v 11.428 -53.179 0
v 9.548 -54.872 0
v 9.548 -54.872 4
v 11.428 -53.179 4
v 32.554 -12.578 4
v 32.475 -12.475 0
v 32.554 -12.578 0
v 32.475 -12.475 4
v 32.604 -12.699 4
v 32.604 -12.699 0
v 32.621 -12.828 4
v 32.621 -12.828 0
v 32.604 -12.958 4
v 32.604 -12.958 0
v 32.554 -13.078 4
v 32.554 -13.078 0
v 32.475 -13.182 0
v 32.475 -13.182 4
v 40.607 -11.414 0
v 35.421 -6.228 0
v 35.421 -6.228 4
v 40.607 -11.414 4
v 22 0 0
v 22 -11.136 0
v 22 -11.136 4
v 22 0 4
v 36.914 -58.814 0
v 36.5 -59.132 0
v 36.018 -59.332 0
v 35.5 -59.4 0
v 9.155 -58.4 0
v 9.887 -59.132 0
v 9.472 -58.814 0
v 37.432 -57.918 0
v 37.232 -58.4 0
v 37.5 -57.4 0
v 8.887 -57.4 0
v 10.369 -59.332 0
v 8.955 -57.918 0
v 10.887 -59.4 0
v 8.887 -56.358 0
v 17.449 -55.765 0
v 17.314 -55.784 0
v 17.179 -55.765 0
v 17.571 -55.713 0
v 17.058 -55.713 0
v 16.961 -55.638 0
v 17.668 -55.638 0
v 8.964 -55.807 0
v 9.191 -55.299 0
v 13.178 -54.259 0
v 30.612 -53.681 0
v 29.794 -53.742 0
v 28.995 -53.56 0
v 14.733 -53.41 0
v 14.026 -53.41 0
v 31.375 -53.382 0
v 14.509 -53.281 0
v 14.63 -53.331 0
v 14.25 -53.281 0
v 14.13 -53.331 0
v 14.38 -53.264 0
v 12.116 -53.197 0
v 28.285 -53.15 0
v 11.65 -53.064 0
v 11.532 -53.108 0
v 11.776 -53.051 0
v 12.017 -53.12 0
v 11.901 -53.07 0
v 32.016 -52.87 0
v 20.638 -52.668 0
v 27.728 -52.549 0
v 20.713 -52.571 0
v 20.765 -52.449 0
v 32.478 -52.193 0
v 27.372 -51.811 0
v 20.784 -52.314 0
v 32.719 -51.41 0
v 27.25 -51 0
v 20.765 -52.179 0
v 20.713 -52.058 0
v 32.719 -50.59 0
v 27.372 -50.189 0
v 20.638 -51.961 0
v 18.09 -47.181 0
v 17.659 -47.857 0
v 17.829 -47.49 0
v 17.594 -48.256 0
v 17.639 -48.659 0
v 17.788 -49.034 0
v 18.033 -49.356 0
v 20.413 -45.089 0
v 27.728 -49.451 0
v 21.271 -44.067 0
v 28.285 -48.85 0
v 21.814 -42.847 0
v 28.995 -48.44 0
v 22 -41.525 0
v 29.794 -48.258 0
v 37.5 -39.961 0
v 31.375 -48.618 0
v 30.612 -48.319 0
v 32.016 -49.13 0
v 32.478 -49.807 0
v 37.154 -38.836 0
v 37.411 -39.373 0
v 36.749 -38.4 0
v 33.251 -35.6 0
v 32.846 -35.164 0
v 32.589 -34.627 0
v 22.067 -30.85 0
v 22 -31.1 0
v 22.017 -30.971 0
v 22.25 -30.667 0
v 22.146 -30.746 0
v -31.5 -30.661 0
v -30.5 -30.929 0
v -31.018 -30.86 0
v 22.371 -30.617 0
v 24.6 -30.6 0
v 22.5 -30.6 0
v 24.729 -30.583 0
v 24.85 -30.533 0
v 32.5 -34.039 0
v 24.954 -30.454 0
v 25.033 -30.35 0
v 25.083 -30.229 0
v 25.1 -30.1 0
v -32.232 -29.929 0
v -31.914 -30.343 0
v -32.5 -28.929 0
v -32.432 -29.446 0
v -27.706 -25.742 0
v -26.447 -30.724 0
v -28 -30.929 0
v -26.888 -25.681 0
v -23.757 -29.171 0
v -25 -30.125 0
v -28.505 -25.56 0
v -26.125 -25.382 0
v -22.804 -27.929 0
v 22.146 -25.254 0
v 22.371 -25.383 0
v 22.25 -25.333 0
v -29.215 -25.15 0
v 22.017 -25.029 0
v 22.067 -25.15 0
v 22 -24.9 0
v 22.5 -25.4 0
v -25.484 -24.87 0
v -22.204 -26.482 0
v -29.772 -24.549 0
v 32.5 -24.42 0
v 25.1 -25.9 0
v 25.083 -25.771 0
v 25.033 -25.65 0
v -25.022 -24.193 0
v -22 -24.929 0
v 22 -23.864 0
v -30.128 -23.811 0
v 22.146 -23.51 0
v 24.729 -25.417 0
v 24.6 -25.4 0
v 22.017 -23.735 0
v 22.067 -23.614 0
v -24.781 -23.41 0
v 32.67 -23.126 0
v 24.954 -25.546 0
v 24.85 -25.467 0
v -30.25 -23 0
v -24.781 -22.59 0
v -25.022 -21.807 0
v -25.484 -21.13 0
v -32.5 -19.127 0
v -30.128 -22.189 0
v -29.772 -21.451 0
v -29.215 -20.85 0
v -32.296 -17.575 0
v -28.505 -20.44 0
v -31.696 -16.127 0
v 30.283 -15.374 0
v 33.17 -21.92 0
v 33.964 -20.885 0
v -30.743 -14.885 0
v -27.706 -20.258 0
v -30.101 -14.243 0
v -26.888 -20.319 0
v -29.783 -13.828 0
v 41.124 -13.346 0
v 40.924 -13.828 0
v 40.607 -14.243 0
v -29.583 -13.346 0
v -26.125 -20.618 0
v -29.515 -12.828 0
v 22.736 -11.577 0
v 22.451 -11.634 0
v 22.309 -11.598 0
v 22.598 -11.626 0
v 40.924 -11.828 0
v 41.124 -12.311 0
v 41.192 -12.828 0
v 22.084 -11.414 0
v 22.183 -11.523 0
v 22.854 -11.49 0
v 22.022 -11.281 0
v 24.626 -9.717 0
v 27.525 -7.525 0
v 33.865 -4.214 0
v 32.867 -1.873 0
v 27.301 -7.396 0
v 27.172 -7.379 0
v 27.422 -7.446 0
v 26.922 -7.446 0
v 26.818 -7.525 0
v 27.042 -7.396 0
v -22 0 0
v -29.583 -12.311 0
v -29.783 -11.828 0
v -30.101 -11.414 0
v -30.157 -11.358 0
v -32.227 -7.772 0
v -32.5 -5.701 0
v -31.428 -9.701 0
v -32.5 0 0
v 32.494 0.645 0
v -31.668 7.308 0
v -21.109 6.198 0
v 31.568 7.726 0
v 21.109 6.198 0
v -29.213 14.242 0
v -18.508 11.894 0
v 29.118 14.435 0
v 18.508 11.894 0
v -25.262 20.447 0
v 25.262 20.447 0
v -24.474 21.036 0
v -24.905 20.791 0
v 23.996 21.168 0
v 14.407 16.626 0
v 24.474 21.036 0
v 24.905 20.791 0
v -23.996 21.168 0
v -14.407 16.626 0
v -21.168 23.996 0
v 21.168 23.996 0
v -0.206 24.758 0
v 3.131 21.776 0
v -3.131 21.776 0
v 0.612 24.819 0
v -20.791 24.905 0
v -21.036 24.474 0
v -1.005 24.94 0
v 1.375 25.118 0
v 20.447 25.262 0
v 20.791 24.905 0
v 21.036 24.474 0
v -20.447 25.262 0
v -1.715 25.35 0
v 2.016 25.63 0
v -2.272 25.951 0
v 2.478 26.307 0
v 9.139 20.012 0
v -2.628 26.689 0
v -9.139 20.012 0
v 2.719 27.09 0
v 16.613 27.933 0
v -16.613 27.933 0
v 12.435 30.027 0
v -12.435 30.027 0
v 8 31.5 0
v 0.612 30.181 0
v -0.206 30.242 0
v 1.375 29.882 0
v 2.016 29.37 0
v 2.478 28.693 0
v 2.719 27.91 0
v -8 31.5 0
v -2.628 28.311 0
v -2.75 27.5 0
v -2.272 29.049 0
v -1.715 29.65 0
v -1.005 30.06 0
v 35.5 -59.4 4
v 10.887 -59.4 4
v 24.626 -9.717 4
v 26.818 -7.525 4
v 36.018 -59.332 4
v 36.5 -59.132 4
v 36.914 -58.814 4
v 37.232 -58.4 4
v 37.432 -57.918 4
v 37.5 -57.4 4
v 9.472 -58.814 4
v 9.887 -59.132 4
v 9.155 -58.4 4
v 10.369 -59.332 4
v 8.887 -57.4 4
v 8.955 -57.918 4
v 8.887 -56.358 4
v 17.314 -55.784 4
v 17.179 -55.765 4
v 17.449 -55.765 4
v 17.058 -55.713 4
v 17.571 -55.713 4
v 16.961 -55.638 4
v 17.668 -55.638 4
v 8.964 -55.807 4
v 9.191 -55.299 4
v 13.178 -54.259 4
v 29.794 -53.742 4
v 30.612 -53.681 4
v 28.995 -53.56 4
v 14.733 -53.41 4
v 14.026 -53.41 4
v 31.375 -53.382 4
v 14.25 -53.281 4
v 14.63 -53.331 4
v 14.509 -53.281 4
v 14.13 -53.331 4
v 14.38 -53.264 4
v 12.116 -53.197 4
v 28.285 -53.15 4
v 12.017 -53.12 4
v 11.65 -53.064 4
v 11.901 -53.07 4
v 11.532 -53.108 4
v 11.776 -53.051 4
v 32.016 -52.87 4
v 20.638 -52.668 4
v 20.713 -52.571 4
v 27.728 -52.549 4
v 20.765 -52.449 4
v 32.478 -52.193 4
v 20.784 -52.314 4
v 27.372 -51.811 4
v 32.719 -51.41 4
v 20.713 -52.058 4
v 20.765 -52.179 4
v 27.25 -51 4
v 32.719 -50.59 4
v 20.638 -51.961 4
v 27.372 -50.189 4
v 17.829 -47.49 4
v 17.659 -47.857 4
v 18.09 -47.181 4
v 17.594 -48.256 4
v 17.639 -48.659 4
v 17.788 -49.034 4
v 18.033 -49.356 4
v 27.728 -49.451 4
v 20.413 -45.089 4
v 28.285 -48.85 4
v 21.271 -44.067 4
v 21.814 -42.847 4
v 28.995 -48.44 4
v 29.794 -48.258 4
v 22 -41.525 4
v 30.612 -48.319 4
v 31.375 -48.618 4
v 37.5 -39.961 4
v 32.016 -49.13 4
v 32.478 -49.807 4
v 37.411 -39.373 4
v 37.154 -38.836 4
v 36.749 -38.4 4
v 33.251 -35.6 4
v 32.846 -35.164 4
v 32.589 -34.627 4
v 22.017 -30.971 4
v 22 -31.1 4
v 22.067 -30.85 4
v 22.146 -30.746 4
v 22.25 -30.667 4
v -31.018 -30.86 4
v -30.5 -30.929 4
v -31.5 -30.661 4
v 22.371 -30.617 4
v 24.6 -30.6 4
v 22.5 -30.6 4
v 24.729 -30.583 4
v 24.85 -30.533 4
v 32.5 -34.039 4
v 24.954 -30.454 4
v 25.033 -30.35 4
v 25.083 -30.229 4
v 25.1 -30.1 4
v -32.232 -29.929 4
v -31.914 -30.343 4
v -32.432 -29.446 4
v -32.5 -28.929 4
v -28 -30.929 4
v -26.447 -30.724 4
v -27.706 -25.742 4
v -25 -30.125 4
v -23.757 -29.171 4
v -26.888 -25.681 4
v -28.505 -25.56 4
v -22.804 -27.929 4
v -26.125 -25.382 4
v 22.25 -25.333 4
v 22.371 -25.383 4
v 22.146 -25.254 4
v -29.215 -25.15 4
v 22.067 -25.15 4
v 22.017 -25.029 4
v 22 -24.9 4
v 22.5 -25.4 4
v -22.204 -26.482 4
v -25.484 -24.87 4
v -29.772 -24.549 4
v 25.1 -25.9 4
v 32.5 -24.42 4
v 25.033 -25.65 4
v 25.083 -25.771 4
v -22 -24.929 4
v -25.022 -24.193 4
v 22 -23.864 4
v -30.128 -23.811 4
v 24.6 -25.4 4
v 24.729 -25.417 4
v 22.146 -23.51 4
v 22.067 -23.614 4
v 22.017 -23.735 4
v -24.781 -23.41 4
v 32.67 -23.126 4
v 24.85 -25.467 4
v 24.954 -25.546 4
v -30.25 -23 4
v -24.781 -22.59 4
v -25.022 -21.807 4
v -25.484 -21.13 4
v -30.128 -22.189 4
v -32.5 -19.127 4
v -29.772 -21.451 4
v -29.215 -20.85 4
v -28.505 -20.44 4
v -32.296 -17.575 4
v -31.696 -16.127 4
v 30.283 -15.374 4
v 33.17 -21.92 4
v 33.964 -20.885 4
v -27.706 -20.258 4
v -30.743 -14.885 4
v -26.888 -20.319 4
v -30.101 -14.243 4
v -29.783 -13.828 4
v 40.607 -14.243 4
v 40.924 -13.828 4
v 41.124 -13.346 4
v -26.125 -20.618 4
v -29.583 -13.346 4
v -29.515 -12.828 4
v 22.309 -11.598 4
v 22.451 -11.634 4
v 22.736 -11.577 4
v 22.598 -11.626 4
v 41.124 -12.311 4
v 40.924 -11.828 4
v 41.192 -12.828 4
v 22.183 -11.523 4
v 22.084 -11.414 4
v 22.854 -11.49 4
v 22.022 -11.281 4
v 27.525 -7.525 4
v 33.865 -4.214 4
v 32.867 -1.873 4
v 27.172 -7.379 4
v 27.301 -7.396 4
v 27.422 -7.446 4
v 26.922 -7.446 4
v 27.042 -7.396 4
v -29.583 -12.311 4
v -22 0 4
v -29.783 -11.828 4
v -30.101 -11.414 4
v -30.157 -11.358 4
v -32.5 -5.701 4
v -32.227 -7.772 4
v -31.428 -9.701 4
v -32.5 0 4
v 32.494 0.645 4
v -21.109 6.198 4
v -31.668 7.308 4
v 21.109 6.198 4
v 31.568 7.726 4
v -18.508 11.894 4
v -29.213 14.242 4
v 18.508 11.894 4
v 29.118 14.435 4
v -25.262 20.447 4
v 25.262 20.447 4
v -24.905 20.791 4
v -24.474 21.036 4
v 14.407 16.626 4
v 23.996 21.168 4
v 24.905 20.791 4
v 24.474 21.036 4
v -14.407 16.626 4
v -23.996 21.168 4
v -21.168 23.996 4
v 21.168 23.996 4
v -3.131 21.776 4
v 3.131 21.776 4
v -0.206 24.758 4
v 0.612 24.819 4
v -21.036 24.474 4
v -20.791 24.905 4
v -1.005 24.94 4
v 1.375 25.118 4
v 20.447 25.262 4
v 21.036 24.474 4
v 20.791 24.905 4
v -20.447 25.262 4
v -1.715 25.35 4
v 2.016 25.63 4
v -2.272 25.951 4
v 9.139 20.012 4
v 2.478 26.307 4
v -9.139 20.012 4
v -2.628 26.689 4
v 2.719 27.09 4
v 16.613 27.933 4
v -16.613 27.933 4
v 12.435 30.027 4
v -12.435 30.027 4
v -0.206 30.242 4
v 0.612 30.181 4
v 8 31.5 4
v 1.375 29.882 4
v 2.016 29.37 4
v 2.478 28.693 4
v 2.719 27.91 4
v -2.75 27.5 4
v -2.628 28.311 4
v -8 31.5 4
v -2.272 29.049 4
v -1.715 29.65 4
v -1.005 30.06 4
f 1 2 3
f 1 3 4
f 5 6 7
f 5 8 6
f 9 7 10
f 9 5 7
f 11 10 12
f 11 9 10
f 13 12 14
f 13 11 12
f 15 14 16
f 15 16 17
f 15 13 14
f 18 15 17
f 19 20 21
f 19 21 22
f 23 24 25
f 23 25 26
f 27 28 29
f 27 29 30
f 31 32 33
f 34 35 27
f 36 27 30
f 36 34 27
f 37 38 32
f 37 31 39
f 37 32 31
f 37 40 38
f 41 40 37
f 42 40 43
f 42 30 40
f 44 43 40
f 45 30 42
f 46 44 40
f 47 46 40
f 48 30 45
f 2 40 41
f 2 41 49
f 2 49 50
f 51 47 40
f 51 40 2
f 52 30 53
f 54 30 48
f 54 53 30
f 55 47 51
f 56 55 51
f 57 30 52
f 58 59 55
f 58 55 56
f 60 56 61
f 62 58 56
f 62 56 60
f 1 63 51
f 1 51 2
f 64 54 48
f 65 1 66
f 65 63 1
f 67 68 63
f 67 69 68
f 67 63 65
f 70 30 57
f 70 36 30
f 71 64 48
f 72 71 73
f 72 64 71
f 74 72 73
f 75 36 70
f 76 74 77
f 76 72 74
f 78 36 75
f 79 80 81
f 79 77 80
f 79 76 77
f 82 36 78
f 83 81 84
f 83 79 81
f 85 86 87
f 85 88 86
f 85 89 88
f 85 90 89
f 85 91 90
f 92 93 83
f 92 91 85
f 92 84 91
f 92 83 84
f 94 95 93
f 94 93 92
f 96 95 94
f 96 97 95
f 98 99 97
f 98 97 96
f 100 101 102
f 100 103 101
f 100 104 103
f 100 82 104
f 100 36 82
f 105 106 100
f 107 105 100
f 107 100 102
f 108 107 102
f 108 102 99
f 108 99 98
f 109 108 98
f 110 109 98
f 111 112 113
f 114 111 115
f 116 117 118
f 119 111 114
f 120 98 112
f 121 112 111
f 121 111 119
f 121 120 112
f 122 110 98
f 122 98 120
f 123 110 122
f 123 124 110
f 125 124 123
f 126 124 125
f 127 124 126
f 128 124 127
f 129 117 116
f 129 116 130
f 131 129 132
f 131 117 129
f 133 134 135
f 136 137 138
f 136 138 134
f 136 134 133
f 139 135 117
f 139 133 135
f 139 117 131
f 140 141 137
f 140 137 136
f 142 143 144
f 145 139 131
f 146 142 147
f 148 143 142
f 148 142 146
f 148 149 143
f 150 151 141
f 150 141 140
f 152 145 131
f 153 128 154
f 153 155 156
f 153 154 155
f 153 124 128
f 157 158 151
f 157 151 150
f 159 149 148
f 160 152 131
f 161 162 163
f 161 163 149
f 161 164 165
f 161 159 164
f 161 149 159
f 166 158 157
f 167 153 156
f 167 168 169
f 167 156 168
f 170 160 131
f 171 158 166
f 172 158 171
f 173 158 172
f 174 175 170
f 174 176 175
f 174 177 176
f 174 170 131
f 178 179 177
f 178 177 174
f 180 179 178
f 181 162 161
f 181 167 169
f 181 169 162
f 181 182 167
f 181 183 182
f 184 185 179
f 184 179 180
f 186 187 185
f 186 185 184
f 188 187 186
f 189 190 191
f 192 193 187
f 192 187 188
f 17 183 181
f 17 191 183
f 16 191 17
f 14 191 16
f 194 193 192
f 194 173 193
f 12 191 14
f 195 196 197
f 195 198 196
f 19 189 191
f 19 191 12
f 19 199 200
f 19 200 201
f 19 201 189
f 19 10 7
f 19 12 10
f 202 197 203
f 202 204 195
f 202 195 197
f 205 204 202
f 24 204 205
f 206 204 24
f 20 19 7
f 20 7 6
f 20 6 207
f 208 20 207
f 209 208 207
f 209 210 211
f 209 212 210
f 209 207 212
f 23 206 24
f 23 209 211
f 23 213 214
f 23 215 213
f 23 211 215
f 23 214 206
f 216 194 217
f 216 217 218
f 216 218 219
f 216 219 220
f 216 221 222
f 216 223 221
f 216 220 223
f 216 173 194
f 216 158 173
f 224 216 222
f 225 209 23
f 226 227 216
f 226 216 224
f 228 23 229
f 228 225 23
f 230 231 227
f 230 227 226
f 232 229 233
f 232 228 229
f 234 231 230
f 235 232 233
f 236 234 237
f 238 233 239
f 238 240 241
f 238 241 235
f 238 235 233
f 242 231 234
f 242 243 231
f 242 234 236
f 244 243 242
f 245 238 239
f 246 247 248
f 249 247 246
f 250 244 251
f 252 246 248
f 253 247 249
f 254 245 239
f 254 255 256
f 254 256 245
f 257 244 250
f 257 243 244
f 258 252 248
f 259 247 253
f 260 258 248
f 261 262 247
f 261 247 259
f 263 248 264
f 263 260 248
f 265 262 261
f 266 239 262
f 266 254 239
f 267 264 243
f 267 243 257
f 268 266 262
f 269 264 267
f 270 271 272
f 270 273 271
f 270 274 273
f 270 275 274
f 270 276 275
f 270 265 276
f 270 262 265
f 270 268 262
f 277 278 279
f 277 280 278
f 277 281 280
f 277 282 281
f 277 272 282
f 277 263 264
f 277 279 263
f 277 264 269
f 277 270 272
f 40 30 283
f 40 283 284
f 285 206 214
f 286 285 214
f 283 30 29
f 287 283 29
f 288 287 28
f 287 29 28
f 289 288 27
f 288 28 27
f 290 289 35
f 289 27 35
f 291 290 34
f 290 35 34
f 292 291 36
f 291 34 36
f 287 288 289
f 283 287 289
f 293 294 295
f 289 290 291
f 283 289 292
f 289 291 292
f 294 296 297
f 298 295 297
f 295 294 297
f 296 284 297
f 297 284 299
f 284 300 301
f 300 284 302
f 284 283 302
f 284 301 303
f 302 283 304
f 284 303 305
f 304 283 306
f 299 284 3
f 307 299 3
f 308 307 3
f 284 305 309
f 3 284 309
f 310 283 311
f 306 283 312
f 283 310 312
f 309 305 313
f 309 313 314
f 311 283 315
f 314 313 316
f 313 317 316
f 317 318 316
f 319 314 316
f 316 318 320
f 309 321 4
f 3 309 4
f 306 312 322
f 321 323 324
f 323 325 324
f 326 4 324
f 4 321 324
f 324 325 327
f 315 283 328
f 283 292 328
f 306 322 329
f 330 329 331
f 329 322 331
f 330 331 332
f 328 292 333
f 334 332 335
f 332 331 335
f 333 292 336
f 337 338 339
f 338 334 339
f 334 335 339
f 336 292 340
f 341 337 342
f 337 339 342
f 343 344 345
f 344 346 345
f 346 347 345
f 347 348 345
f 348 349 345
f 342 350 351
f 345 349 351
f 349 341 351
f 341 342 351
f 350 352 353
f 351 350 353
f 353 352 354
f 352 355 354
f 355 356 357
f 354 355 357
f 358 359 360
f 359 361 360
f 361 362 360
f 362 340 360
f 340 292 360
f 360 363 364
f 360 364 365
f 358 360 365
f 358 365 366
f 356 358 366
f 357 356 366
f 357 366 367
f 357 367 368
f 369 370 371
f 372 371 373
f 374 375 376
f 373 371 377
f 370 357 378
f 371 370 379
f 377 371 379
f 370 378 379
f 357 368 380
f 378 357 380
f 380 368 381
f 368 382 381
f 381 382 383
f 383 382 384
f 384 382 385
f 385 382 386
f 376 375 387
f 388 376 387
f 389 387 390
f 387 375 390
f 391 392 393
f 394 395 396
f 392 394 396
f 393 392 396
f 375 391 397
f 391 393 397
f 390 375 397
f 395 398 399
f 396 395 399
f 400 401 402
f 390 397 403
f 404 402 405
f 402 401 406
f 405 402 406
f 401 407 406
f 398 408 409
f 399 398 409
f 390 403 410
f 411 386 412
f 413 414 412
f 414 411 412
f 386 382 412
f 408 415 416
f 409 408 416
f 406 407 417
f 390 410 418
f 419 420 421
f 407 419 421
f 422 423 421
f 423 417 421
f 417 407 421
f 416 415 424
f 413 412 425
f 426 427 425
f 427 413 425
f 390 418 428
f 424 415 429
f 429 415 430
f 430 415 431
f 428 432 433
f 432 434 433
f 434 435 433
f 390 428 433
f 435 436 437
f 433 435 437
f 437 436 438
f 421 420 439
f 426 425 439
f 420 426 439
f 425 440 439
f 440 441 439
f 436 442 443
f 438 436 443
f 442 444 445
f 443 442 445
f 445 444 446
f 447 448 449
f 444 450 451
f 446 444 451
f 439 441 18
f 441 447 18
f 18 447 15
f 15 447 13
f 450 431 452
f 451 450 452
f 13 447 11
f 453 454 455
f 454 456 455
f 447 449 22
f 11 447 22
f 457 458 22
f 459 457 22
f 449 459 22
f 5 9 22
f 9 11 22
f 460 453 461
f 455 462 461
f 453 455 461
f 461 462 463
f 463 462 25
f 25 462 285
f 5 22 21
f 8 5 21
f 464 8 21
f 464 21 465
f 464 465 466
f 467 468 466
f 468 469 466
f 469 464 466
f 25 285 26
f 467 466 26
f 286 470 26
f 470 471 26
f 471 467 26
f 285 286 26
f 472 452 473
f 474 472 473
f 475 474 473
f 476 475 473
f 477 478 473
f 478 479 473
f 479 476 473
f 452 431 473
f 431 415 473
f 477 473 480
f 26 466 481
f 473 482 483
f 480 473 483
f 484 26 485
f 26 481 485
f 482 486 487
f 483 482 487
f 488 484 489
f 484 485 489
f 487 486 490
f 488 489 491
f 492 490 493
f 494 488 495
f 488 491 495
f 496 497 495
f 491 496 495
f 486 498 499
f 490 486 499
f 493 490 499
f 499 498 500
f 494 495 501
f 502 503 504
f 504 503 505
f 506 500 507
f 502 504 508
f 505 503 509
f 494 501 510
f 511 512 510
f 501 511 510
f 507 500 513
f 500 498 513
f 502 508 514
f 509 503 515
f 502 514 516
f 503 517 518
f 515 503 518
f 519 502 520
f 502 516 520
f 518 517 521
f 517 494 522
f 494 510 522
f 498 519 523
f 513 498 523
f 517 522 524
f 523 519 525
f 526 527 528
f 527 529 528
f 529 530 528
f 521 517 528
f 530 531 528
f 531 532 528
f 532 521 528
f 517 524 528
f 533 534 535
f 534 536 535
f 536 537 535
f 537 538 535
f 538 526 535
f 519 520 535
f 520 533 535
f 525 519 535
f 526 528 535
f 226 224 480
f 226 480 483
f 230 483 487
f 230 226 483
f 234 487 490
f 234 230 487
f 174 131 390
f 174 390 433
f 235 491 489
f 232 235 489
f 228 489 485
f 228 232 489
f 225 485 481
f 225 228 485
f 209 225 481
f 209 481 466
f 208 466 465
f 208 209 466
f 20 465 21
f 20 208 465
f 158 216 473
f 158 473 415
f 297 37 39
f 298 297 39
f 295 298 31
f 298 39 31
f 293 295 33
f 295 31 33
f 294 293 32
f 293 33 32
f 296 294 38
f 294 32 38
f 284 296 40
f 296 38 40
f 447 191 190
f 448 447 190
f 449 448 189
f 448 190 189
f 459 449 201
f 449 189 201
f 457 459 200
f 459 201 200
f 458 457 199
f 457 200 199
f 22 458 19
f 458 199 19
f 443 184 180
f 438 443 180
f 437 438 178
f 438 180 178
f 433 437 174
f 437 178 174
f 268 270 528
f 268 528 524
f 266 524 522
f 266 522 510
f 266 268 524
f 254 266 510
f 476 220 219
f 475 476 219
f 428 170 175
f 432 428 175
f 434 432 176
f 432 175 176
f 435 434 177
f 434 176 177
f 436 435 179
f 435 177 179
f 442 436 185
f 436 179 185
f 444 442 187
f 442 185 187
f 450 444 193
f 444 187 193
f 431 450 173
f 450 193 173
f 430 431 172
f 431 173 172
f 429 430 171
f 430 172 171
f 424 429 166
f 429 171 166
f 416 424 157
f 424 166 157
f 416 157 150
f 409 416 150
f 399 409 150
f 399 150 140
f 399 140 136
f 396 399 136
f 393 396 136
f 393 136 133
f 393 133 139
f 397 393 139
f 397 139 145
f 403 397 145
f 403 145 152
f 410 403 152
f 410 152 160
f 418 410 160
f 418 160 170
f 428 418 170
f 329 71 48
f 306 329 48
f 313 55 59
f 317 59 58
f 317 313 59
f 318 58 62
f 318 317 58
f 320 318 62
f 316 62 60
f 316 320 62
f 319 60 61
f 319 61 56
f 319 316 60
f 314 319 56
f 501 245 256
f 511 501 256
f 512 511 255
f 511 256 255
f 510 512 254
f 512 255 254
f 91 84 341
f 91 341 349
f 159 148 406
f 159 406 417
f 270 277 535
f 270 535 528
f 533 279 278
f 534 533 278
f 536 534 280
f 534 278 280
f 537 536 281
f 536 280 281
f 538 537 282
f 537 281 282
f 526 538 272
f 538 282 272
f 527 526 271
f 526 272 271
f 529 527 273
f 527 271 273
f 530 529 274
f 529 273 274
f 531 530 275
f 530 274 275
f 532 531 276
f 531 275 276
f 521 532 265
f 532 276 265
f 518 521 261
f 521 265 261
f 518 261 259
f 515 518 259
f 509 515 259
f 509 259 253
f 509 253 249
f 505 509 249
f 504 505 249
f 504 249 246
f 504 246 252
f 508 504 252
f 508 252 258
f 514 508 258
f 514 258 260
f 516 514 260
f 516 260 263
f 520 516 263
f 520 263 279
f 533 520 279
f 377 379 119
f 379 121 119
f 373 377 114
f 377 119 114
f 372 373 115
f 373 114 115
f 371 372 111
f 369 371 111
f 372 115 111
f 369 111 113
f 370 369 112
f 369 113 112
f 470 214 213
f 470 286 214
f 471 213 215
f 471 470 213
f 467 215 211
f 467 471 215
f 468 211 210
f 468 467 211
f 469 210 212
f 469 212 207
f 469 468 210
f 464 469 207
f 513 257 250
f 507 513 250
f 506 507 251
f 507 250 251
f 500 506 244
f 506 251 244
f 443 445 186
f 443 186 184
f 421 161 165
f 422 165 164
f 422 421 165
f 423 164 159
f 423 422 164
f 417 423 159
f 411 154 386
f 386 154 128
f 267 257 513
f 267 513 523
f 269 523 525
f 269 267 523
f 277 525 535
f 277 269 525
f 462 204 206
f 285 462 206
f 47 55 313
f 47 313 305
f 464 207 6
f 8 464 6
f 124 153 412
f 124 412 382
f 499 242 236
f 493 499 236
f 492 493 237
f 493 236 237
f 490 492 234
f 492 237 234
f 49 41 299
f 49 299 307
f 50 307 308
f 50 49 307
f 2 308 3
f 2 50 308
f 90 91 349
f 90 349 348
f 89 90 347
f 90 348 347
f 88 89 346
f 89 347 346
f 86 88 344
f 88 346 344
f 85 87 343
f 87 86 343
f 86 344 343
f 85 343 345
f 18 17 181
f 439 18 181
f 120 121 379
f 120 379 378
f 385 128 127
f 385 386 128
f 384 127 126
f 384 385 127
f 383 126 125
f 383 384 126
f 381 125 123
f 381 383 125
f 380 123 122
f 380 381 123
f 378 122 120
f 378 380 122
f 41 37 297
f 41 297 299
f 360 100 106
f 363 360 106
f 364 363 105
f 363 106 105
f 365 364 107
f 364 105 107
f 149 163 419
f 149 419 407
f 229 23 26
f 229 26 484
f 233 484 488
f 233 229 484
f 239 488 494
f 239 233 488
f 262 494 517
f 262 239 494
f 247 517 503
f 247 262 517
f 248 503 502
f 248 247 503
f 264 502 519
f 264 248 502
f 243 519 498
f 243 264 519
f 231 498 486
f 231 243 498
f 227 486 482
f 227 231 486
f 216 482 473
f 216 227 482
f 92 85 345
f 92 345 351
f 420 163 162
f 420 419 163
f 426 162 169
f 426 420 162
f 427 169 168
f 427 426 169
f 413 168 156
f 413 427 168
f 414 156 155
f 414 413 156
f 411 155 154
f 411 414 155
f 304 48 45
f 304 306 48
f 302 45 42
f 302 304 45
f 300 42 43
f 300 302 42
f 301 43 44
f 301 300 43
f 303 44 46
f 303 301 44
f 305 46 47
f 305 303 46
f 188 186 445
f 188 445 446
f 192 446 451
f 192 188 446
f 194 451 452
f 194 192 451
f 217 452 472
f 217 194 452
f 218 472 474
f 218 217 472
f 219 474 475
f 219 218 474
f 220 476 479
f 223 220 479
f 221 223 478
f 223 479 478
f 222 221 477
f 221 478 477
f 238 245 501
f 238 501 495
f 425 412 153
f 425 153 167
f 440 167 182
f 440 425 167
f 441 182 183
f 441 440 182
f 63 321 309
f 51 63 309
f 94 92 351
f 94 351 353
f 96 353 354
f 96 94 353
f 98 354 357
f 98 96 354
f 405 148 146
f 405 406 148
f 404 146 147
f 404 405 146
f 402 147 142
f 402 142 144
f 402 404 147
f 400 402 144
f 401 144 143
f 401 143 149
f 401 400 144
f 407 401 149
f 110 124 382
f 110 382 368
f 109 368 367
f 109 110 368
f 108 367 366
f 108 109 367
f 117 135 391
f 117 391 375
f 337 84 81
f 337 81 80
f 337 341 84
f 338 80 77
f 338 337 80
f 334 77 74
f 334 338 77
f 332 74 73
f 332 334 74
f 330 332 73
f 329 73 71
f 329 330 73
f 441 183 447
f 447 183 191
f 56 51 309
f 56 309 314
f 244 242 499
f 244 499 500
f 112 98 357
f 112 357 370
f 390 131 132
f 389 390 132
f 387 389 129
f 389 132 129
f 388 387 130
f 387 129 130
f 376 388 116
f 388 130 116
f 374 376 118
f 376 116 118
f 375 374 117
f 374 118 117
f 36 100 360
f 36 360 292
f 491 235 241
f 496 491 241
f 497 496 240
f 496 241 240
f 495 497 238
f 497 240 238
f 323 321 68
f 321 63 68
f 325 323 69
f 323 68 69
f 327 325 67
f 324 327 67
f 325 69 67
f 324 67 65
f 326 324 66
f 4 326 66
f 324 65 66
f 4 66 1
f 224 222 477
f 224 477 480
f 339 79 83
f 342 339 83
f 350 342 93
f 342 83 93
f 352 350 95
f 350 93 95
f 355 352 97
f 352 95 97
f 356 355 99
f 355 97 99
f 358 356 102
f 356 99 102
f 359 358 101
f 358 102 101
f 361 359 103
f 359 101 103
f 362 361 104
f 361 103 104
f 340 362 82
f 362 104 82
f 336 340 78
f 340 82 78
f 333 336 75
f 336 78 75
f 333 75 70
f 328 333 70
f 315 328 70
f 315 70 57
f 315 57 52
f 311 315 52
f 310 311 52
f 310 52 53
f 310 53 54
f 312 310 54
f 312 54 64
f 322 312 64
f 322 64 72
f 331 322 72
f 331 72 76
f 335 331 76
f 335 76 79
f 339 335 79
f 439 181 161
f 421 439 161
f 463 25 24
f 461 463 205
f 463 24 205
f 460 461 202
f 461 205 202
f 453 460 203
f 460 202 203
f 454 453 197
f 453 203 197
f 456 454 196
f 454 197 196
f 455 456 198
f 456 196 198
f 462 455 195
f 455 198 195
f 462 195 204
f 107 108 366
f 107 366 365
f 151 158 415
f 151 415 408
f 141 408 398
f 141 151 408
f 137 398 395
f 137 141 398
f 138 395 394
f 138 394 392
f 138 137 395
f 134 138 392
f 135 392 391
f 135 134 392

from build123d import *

# Parameters (mm, degrees)
CORPS_DEPTH                     = 4
DIAM_TRE_DU_PER_AGE_5_5_5_5_2_D = 5.5
RENFORT_CAVITE_IR_DEPTH         = 4
CAVITE_IR_DEPTH                 = 73.870494144
CAVITE_SWITCH_DEPTH             = 73.870494144
CONG_1_R                        = 2
CONG_1_R_2                      = 5
CONG_1_R_3                      = 10
CONG_1_R_4                      = 8
CONG_1_R_5                      = 6
CONG_1_R_6                      = 1.5
CONG_2_R                        = 0.5


with BuildPart() as part:
    # Esquisse1 → corps (new body)
    with BuildSketch(Plane.XY):
        with BuildLine():
            Line((-21.1677086, 23.996135725), (-21.1677086, 24.661267457))
            ThreePointArc((-21.1677086, 24.661267457), (-14.979348182, 28.84214153), (-8, 31.5))
            Line((-8, 31.5), (8, 31.5))
            ThreePointArc((8, 31.5), (14.979348182, 28.84214153), (21.1677086, 24.661267457))
            Line((21.1677086, 24.661267457), (21.1677086, 23.996135725))
            Line((21.1677086, 23.996135725), (23.996135725, 21.1677086))
            Line((23.996135725, 21.1677086), (24.661267457, 21.1677086))
            ThreePointArc((24.661267457, 21.1677086), (30.477378434, 11.286248439), (32.5, 0))
            Line((32.5, 0), (32.5, -35))
            Line((32.5, -35), (37.5, -39))
            Line((37.5, -39), (37.5, -59.4))
            Line((37.5, -59.4), (8.886620253, -59.4))
            Line((8.886620253, -59.4), (8.886620253, -56.358407696))
            ThreePointArc((8.886620253, -56.358407696), (9.059529338, -55.54493441), (9.54835904, -54.872118045))
            Line((9.54835904, -54.872118045), (20.413163329, -45.089404323))
            ThreePointArc((20.413163329, -45.089404323), (21.585367396, -43.476003838), (22, -41.525310806))
            Line((22, -41.525310806), (22, 0))
            ThreePointArc((22, 0), (0, 22), (-22, 0))
            Line((-22, 0), (-22, -24.928632557))
            ThreePointArc((-22, -24.928632557), (-23.757359313, -29.171273244), (-28, -30.928632557))
            Line((-28, -30.928632557), (-32.5, -30.928632557))
            Line((-32.5, -30.928632557), (-32.5, 0))
            ThreePointArc((-32.5, 0), (-30.477378434, 11.286248439), (-24.661267457, 21.1677086))
            Line((-24.661267457, 21.1677086), (-23.996135725, 21.1677086))
            Line((-23.996135725, 21.1677086), (-21.1677086, 23.996135725))
        make_face()
    extrude(amount=CORPS_DEPTH)

    # Diamètre du perçage Ø5.5 (5.5)2 (through all)
    with Locations(Plane.XY.offset(4)):
        with Locations((0, 27.5), (30, -51), (-27.5, -23)):
            Hole(DIAM_TRE_DU_PER_AGE_5_5_5_5_2_D / 2)

    # Esquisse4 → renfort_cavite_IR (add, through all)
    with BuildSketch(Plane.XY):
        Polygon((31.767766953, -2.575378798), (42.02081528, -12.828427125), (34.87903679, -19.970205615), (27.454415588, -27.394826817), (24.625988463, -9.717157288), align=None)
    extrude(amount=RENFORT_CAVITE_IR_DEPTH)

    # Esquisse4<4> → cavite_IR (cut, through all)
    with BuildSketch(Plane.XY):
        Polygon((0, -34.343145751), (24.625988463, -9.717157288), (27.171572875, -7.171572875), (32.828427125, -12.828427125), (30.282842712, -15.374011537), (0, -45.656854249), align=None)
        Polygon((-75.939696962, -31.797561338), (-42.828427125, 1.313708499), (-28.686291501, -12.828427125), (-61.797561338, -45.939696962), align=None)
    extrude(amount=CAVITE_IR_DEPTH, mode=Mode.SUBTRACT)

    # Esquisse5 → cavite_switch (cut, through all)
    with BuildSketch(Plane.XY):
        Polygon((13.884745674, -52.561700936), (12.661450942, -51.338406204), (16.338406204, -47.661450942), (17.561700936, -48.884745674), (17.915254326, -49.238299064), (20.920458146, -52.243502884), (20.991168825, -52.314213562), (17.314213562, -55.991168825), (17.243502884, -55.920458146), (14.238299064, -52.915254326), align=None)
        Polygon((13.884745674, -52.561700936), (12.661450942, -51.338406204), (11.459369414, -52.540487732), (13.177638892, -54.258757211), (14.37972042, -53.056675683), (14.238299064, -52.915254326), align=None)
        Polygon((18.52, -25.4), (20.25, -25.4), (20.75, -25.4), (25, -25.4), (25.1, -25.4), (25.1, -30.6), (25, -30.6), (20.75, -30.6), (20.25, -30.6), (18.52, -30.6), align=None)
        Polygon((20.75, -30.6), (20.25, -30.6), (18.52, -30.6), (18.52, -32.3), (20.95, -32.3), (20.95, -30.6), align=None)
    extrude(amount=CAVITE_SWITCH_DEPTH, mode=Mode.SUBTRACT)

    # Congé1
    # the kernel refuses this fillet: 10, 8, 6, 5, 2, 1.5 mm, written as the material it adds along each edge
    with BuildSketch(Plane(origin=(-28.686291501, -12.828427125, 0), x_dir=(-0.7071067811865516, 0.7071067811865436, 0), z_dir=(0, 0, 1))) as cong_1_piece_1:
        with BuildLine():
            CenterArc((CONG_1_R, CONG_1_R), CONG_1_R, 180, 90)
            Line((0, CONG_1_R), (0, 0))
            Line((0, 0), (CONG_1_R, 0))
        make_face()
    extrude(amount=4)
    with BuildSketch(Plane(origin=(32.5, -35, 0), x_dir=(0.7808688094430325, -0.6246950475544215, 0), z_dir=(0, 0, 1))) as cong_1_piece_2:
        with BuildLine():
            CenterArc((CONG_1_R * 0.480624847487, CONG_1_R), CONG_1_R, 218.659808254, 51.340191746)
            Line((-CONG_1_R * 0.300243961956, CONG_1_R * 0.375304952446), (0, 0))
            Line((0, 0), (CONG_1_R * 0.480624847487, 0))
        make_face()
    extrude(amount=4)
    with BuildSketch(Plane(origin=(32.5, -22.349242405, 4), x_dir=(0, -1, 0), z_dir=(0, 0, -1))) as cong_1_piece_3:
        with BuildLine():
            CenterArc((CONG_1_R_2 * 0.414213562373, -CONG_1_R_2), CONG_1_R_2, 90, 45)
            Line((-CONG_1_R_2 * 0.292893218813, -CONG_1_R_2 * 0.292893218813), (0, 0))
            Line((0, 0), (CONG_1_R_2 * 0.414213562373, 0))
        make_face()
    extrude(amount=4)
    with BuildSketch(Plane(origin=(32.5, -3.307611845, 0), x_dir=(0.7071067811865513, -0.7071067811865438, 0), z_dir=(0, 0, 1))) as cong_1_piece_4:
        with BuildLine():
            CenterArc((4.130314106, 10), CONG_1_R_3, 226.136395215, 43.863604785)
            Line((-2.799125719, 2.790085736), (-3.492069702, 2.069094309))
            ThreePointArc((-3.492069702, 2.069094309), (-3.045941546, 1.631727984), (-0.707106781, -0.707106781))
            Line((-0.707106781, -0.707106781), (0, -1))
            Line((0, -1), (4.130314106, -1))
            Line((4.130314106, -1), (4.130314106, 0))
        make_face()
    extrude(amount=4)
    # the kernel refuses this fillet: 10, 8, 6, 5, 2, 1.5 mm, written as the material it takes off along each edge
    with BuildSketch(Plane(origin=(-32.5, -30.928632557, -5), x_dir=(0, 1, 0), z_dir=(0, 0, 1)), Plane(origin=(37.5, -59.4, -5), x_dir=(-1, 0, 0), z_dir=(0, 0, 1)), Plane(origin=(42.02081528, -12.828427125, -5), x_dir=(-0.7071067811865427, -0.7071067811865525, 0), z_dir=(0, 0, 1)), Plane(origin=(8.886620253, -59.4, -5), x_dir=(0, 1, 0), z_dir=(0, 0, 1))) as cong_1_2_piece_1:
        with BuildLine():
            CenterArc((CONG_1_R, -CONG_1_R), CONG_1_R, 90, 90)
            Line((0, -CONG_1_R), (0, 0))
            Line((0, 0), (CONG_1_R, 0))
        make_face()
    extrude(amount=14, mode=Mode.SUBTRACT)
    with BuildSketch(Plane(origin=(37.5, -39, -2.403124237), x_dir=(0, -1, 0), z_dir=(0, 0, 1))) as cong_1_2_piece_2:
        with BuildLine():
            CenterArc((CONG_1_R * 0.480624847487, -CONG_1_R), CONG_1_R, 90, 51.340191746)
            Line((-CONG_1_R * 0.300243961956, -CONG_1_R * 0.375304952446), (0, 0))
            Line((0, 0), (CONG_1_R * 0.480624847487, 0))
        make_face()
    extrude(amount=8.806248475, mode=Mode.SUBTRACT)
    with BuildSketch(Plane(origin=(21.1677086, 24.661267457, -2.345925687), x_dir=(0, -1, 0), z_dir=(0, 0, 1)), Plane(origin=(-24.661267457, 21.1677086, -2.345925687), x_dir=(1, 0, 0), z_dir=(0, 0, 1))) as cong_1_2_piece_3:
        with BuildLine():
            CenterArc((0.953759933, -1.97906386), CONG_1_R, 98.297562286, 42.71603868)
            ThreePointArc((-0.600830724, -0.720792074), (-0.30301692, -0.358227456), (0, 0))
            Line((0, 0), (0.665131732, 0))
        make_face()
    extrude(amount=8.691851375, mode=Mode.SUBTRACT)
    with BuildSketch(Plane(origin=(24.661267457, 21.1677086, -2.345925687), x_dir=(-1, 0, 0), z_dir=(0, 0, 1)), Plane(origin=(-21.1677086, 24.661267457, -2.345925687), x_dir=(0, -1, 0), z_dir=(0, 0, 1))) as cong_1_2_piece_4:
        with BuildLine():
            CenterArc((0.953759933, 1.97906386), CONG_1_R, 218.986399033, 42.71603868)
            ThreePointArc((-0.600830724, 0.720792074), (-0.30301692, 0.358227456), (0, 0))
            Line((0, 0), (0.665131732, 0))
        make_face()
    extrude(amount=8.691851375, mode=Mode.SUBTRACT)
    with BuildSketch(Plane(origin=(-32.5, -9.014718626, 12.284271247), x_dir=(0, 1, 0), z_dir=(0, 0, -1))) as cong_1_2_piece_5:
        with BuildLine():
            CenterArc((CONG_1_R_4 * 0.414213562373, CONG_1_R_4), CONG_1_R_4, 225, 45)
            Line((-CONG_1_R_4 * 0.292893218813, CONG_1_R_4 * 0.292893218813), (0, 0))
            Line((0, 0), (CONG_1_R_4 * 0.414213562373, 0))
        make_face()
    extrude(amount=20.568542495, mode=Mode.SUBTRACT)
    with BuildSketch(Plane(origin=(-32.5, -16.642135624, -6.213203436), x_dir=(0.7071067811865432, 0.7071067811865519, 0), z_dir=(0, 0, 1))) as cong_1_2_piece_6:
        with BuildLine():
            CenterArc((CONG_1_R_5 * 0.414213562373, -CONG_1_R_5), CONG_1_R_5, 90, 45)
            Line((-CONG_1_R_5 * 0.292893218813, -CONG_1_R_5 * 0.292893218813), (0, 0))
            Line((0, 0), (CONG_1_R_5 * 0.414213562373, 0))
        make_face()
    extrude(amount=16.426406871, mode=Mode.SUBTRACT)
    with BuildSketch(Plane(origin=(16.915589345, -48.238634083, 7.95167547), x_dir=(0.7431448254773909, 0.6691306063588618, 0), z_dir=(0, 0, -1))) as cong_1_2_piece_7:
        with BuildLine():
            CenterArc((CONG_1_R_6 * 1.05378012528, CONG_1_R_6), CONG_1_R_6, 177, 93)
            Line((CONG_1_R_6 * 0.0551505905264, CONG_1_R_6 * 1.05233595624), (0, 0))
            Line((0, 0), (CONG_1_R_6 * 1.05378012528, 0))
        make_face()
    extrude(amount=11.90335094, mode=Mode.SUBTRACT)

    # Congé2
    cong_2_edges = [part.edges().sort_by_distance(p)[0] for p in [
        (22, -12.343145751, 2),
        (27.171572875, -7.171572875, 2),
        (22, -23.656854249, 2),
        (32.828427125, -12.828427125, 2),
        (11.780853072, -52.86197139, 2),
        (20.991168825, -52.314213562, 2),
        (14.37972042, -53.056675683, 2),
        (17.314213562, -55.991168825, 2),
        (22, -25.4, 2),
        (25.1, -25.4, 2),
        (22, -30.6, 2),
        (25.1, -30.6, 2),
    ]]
    fillet(cong_2_edges, radius=CONG_2_R)


solid = part.part
